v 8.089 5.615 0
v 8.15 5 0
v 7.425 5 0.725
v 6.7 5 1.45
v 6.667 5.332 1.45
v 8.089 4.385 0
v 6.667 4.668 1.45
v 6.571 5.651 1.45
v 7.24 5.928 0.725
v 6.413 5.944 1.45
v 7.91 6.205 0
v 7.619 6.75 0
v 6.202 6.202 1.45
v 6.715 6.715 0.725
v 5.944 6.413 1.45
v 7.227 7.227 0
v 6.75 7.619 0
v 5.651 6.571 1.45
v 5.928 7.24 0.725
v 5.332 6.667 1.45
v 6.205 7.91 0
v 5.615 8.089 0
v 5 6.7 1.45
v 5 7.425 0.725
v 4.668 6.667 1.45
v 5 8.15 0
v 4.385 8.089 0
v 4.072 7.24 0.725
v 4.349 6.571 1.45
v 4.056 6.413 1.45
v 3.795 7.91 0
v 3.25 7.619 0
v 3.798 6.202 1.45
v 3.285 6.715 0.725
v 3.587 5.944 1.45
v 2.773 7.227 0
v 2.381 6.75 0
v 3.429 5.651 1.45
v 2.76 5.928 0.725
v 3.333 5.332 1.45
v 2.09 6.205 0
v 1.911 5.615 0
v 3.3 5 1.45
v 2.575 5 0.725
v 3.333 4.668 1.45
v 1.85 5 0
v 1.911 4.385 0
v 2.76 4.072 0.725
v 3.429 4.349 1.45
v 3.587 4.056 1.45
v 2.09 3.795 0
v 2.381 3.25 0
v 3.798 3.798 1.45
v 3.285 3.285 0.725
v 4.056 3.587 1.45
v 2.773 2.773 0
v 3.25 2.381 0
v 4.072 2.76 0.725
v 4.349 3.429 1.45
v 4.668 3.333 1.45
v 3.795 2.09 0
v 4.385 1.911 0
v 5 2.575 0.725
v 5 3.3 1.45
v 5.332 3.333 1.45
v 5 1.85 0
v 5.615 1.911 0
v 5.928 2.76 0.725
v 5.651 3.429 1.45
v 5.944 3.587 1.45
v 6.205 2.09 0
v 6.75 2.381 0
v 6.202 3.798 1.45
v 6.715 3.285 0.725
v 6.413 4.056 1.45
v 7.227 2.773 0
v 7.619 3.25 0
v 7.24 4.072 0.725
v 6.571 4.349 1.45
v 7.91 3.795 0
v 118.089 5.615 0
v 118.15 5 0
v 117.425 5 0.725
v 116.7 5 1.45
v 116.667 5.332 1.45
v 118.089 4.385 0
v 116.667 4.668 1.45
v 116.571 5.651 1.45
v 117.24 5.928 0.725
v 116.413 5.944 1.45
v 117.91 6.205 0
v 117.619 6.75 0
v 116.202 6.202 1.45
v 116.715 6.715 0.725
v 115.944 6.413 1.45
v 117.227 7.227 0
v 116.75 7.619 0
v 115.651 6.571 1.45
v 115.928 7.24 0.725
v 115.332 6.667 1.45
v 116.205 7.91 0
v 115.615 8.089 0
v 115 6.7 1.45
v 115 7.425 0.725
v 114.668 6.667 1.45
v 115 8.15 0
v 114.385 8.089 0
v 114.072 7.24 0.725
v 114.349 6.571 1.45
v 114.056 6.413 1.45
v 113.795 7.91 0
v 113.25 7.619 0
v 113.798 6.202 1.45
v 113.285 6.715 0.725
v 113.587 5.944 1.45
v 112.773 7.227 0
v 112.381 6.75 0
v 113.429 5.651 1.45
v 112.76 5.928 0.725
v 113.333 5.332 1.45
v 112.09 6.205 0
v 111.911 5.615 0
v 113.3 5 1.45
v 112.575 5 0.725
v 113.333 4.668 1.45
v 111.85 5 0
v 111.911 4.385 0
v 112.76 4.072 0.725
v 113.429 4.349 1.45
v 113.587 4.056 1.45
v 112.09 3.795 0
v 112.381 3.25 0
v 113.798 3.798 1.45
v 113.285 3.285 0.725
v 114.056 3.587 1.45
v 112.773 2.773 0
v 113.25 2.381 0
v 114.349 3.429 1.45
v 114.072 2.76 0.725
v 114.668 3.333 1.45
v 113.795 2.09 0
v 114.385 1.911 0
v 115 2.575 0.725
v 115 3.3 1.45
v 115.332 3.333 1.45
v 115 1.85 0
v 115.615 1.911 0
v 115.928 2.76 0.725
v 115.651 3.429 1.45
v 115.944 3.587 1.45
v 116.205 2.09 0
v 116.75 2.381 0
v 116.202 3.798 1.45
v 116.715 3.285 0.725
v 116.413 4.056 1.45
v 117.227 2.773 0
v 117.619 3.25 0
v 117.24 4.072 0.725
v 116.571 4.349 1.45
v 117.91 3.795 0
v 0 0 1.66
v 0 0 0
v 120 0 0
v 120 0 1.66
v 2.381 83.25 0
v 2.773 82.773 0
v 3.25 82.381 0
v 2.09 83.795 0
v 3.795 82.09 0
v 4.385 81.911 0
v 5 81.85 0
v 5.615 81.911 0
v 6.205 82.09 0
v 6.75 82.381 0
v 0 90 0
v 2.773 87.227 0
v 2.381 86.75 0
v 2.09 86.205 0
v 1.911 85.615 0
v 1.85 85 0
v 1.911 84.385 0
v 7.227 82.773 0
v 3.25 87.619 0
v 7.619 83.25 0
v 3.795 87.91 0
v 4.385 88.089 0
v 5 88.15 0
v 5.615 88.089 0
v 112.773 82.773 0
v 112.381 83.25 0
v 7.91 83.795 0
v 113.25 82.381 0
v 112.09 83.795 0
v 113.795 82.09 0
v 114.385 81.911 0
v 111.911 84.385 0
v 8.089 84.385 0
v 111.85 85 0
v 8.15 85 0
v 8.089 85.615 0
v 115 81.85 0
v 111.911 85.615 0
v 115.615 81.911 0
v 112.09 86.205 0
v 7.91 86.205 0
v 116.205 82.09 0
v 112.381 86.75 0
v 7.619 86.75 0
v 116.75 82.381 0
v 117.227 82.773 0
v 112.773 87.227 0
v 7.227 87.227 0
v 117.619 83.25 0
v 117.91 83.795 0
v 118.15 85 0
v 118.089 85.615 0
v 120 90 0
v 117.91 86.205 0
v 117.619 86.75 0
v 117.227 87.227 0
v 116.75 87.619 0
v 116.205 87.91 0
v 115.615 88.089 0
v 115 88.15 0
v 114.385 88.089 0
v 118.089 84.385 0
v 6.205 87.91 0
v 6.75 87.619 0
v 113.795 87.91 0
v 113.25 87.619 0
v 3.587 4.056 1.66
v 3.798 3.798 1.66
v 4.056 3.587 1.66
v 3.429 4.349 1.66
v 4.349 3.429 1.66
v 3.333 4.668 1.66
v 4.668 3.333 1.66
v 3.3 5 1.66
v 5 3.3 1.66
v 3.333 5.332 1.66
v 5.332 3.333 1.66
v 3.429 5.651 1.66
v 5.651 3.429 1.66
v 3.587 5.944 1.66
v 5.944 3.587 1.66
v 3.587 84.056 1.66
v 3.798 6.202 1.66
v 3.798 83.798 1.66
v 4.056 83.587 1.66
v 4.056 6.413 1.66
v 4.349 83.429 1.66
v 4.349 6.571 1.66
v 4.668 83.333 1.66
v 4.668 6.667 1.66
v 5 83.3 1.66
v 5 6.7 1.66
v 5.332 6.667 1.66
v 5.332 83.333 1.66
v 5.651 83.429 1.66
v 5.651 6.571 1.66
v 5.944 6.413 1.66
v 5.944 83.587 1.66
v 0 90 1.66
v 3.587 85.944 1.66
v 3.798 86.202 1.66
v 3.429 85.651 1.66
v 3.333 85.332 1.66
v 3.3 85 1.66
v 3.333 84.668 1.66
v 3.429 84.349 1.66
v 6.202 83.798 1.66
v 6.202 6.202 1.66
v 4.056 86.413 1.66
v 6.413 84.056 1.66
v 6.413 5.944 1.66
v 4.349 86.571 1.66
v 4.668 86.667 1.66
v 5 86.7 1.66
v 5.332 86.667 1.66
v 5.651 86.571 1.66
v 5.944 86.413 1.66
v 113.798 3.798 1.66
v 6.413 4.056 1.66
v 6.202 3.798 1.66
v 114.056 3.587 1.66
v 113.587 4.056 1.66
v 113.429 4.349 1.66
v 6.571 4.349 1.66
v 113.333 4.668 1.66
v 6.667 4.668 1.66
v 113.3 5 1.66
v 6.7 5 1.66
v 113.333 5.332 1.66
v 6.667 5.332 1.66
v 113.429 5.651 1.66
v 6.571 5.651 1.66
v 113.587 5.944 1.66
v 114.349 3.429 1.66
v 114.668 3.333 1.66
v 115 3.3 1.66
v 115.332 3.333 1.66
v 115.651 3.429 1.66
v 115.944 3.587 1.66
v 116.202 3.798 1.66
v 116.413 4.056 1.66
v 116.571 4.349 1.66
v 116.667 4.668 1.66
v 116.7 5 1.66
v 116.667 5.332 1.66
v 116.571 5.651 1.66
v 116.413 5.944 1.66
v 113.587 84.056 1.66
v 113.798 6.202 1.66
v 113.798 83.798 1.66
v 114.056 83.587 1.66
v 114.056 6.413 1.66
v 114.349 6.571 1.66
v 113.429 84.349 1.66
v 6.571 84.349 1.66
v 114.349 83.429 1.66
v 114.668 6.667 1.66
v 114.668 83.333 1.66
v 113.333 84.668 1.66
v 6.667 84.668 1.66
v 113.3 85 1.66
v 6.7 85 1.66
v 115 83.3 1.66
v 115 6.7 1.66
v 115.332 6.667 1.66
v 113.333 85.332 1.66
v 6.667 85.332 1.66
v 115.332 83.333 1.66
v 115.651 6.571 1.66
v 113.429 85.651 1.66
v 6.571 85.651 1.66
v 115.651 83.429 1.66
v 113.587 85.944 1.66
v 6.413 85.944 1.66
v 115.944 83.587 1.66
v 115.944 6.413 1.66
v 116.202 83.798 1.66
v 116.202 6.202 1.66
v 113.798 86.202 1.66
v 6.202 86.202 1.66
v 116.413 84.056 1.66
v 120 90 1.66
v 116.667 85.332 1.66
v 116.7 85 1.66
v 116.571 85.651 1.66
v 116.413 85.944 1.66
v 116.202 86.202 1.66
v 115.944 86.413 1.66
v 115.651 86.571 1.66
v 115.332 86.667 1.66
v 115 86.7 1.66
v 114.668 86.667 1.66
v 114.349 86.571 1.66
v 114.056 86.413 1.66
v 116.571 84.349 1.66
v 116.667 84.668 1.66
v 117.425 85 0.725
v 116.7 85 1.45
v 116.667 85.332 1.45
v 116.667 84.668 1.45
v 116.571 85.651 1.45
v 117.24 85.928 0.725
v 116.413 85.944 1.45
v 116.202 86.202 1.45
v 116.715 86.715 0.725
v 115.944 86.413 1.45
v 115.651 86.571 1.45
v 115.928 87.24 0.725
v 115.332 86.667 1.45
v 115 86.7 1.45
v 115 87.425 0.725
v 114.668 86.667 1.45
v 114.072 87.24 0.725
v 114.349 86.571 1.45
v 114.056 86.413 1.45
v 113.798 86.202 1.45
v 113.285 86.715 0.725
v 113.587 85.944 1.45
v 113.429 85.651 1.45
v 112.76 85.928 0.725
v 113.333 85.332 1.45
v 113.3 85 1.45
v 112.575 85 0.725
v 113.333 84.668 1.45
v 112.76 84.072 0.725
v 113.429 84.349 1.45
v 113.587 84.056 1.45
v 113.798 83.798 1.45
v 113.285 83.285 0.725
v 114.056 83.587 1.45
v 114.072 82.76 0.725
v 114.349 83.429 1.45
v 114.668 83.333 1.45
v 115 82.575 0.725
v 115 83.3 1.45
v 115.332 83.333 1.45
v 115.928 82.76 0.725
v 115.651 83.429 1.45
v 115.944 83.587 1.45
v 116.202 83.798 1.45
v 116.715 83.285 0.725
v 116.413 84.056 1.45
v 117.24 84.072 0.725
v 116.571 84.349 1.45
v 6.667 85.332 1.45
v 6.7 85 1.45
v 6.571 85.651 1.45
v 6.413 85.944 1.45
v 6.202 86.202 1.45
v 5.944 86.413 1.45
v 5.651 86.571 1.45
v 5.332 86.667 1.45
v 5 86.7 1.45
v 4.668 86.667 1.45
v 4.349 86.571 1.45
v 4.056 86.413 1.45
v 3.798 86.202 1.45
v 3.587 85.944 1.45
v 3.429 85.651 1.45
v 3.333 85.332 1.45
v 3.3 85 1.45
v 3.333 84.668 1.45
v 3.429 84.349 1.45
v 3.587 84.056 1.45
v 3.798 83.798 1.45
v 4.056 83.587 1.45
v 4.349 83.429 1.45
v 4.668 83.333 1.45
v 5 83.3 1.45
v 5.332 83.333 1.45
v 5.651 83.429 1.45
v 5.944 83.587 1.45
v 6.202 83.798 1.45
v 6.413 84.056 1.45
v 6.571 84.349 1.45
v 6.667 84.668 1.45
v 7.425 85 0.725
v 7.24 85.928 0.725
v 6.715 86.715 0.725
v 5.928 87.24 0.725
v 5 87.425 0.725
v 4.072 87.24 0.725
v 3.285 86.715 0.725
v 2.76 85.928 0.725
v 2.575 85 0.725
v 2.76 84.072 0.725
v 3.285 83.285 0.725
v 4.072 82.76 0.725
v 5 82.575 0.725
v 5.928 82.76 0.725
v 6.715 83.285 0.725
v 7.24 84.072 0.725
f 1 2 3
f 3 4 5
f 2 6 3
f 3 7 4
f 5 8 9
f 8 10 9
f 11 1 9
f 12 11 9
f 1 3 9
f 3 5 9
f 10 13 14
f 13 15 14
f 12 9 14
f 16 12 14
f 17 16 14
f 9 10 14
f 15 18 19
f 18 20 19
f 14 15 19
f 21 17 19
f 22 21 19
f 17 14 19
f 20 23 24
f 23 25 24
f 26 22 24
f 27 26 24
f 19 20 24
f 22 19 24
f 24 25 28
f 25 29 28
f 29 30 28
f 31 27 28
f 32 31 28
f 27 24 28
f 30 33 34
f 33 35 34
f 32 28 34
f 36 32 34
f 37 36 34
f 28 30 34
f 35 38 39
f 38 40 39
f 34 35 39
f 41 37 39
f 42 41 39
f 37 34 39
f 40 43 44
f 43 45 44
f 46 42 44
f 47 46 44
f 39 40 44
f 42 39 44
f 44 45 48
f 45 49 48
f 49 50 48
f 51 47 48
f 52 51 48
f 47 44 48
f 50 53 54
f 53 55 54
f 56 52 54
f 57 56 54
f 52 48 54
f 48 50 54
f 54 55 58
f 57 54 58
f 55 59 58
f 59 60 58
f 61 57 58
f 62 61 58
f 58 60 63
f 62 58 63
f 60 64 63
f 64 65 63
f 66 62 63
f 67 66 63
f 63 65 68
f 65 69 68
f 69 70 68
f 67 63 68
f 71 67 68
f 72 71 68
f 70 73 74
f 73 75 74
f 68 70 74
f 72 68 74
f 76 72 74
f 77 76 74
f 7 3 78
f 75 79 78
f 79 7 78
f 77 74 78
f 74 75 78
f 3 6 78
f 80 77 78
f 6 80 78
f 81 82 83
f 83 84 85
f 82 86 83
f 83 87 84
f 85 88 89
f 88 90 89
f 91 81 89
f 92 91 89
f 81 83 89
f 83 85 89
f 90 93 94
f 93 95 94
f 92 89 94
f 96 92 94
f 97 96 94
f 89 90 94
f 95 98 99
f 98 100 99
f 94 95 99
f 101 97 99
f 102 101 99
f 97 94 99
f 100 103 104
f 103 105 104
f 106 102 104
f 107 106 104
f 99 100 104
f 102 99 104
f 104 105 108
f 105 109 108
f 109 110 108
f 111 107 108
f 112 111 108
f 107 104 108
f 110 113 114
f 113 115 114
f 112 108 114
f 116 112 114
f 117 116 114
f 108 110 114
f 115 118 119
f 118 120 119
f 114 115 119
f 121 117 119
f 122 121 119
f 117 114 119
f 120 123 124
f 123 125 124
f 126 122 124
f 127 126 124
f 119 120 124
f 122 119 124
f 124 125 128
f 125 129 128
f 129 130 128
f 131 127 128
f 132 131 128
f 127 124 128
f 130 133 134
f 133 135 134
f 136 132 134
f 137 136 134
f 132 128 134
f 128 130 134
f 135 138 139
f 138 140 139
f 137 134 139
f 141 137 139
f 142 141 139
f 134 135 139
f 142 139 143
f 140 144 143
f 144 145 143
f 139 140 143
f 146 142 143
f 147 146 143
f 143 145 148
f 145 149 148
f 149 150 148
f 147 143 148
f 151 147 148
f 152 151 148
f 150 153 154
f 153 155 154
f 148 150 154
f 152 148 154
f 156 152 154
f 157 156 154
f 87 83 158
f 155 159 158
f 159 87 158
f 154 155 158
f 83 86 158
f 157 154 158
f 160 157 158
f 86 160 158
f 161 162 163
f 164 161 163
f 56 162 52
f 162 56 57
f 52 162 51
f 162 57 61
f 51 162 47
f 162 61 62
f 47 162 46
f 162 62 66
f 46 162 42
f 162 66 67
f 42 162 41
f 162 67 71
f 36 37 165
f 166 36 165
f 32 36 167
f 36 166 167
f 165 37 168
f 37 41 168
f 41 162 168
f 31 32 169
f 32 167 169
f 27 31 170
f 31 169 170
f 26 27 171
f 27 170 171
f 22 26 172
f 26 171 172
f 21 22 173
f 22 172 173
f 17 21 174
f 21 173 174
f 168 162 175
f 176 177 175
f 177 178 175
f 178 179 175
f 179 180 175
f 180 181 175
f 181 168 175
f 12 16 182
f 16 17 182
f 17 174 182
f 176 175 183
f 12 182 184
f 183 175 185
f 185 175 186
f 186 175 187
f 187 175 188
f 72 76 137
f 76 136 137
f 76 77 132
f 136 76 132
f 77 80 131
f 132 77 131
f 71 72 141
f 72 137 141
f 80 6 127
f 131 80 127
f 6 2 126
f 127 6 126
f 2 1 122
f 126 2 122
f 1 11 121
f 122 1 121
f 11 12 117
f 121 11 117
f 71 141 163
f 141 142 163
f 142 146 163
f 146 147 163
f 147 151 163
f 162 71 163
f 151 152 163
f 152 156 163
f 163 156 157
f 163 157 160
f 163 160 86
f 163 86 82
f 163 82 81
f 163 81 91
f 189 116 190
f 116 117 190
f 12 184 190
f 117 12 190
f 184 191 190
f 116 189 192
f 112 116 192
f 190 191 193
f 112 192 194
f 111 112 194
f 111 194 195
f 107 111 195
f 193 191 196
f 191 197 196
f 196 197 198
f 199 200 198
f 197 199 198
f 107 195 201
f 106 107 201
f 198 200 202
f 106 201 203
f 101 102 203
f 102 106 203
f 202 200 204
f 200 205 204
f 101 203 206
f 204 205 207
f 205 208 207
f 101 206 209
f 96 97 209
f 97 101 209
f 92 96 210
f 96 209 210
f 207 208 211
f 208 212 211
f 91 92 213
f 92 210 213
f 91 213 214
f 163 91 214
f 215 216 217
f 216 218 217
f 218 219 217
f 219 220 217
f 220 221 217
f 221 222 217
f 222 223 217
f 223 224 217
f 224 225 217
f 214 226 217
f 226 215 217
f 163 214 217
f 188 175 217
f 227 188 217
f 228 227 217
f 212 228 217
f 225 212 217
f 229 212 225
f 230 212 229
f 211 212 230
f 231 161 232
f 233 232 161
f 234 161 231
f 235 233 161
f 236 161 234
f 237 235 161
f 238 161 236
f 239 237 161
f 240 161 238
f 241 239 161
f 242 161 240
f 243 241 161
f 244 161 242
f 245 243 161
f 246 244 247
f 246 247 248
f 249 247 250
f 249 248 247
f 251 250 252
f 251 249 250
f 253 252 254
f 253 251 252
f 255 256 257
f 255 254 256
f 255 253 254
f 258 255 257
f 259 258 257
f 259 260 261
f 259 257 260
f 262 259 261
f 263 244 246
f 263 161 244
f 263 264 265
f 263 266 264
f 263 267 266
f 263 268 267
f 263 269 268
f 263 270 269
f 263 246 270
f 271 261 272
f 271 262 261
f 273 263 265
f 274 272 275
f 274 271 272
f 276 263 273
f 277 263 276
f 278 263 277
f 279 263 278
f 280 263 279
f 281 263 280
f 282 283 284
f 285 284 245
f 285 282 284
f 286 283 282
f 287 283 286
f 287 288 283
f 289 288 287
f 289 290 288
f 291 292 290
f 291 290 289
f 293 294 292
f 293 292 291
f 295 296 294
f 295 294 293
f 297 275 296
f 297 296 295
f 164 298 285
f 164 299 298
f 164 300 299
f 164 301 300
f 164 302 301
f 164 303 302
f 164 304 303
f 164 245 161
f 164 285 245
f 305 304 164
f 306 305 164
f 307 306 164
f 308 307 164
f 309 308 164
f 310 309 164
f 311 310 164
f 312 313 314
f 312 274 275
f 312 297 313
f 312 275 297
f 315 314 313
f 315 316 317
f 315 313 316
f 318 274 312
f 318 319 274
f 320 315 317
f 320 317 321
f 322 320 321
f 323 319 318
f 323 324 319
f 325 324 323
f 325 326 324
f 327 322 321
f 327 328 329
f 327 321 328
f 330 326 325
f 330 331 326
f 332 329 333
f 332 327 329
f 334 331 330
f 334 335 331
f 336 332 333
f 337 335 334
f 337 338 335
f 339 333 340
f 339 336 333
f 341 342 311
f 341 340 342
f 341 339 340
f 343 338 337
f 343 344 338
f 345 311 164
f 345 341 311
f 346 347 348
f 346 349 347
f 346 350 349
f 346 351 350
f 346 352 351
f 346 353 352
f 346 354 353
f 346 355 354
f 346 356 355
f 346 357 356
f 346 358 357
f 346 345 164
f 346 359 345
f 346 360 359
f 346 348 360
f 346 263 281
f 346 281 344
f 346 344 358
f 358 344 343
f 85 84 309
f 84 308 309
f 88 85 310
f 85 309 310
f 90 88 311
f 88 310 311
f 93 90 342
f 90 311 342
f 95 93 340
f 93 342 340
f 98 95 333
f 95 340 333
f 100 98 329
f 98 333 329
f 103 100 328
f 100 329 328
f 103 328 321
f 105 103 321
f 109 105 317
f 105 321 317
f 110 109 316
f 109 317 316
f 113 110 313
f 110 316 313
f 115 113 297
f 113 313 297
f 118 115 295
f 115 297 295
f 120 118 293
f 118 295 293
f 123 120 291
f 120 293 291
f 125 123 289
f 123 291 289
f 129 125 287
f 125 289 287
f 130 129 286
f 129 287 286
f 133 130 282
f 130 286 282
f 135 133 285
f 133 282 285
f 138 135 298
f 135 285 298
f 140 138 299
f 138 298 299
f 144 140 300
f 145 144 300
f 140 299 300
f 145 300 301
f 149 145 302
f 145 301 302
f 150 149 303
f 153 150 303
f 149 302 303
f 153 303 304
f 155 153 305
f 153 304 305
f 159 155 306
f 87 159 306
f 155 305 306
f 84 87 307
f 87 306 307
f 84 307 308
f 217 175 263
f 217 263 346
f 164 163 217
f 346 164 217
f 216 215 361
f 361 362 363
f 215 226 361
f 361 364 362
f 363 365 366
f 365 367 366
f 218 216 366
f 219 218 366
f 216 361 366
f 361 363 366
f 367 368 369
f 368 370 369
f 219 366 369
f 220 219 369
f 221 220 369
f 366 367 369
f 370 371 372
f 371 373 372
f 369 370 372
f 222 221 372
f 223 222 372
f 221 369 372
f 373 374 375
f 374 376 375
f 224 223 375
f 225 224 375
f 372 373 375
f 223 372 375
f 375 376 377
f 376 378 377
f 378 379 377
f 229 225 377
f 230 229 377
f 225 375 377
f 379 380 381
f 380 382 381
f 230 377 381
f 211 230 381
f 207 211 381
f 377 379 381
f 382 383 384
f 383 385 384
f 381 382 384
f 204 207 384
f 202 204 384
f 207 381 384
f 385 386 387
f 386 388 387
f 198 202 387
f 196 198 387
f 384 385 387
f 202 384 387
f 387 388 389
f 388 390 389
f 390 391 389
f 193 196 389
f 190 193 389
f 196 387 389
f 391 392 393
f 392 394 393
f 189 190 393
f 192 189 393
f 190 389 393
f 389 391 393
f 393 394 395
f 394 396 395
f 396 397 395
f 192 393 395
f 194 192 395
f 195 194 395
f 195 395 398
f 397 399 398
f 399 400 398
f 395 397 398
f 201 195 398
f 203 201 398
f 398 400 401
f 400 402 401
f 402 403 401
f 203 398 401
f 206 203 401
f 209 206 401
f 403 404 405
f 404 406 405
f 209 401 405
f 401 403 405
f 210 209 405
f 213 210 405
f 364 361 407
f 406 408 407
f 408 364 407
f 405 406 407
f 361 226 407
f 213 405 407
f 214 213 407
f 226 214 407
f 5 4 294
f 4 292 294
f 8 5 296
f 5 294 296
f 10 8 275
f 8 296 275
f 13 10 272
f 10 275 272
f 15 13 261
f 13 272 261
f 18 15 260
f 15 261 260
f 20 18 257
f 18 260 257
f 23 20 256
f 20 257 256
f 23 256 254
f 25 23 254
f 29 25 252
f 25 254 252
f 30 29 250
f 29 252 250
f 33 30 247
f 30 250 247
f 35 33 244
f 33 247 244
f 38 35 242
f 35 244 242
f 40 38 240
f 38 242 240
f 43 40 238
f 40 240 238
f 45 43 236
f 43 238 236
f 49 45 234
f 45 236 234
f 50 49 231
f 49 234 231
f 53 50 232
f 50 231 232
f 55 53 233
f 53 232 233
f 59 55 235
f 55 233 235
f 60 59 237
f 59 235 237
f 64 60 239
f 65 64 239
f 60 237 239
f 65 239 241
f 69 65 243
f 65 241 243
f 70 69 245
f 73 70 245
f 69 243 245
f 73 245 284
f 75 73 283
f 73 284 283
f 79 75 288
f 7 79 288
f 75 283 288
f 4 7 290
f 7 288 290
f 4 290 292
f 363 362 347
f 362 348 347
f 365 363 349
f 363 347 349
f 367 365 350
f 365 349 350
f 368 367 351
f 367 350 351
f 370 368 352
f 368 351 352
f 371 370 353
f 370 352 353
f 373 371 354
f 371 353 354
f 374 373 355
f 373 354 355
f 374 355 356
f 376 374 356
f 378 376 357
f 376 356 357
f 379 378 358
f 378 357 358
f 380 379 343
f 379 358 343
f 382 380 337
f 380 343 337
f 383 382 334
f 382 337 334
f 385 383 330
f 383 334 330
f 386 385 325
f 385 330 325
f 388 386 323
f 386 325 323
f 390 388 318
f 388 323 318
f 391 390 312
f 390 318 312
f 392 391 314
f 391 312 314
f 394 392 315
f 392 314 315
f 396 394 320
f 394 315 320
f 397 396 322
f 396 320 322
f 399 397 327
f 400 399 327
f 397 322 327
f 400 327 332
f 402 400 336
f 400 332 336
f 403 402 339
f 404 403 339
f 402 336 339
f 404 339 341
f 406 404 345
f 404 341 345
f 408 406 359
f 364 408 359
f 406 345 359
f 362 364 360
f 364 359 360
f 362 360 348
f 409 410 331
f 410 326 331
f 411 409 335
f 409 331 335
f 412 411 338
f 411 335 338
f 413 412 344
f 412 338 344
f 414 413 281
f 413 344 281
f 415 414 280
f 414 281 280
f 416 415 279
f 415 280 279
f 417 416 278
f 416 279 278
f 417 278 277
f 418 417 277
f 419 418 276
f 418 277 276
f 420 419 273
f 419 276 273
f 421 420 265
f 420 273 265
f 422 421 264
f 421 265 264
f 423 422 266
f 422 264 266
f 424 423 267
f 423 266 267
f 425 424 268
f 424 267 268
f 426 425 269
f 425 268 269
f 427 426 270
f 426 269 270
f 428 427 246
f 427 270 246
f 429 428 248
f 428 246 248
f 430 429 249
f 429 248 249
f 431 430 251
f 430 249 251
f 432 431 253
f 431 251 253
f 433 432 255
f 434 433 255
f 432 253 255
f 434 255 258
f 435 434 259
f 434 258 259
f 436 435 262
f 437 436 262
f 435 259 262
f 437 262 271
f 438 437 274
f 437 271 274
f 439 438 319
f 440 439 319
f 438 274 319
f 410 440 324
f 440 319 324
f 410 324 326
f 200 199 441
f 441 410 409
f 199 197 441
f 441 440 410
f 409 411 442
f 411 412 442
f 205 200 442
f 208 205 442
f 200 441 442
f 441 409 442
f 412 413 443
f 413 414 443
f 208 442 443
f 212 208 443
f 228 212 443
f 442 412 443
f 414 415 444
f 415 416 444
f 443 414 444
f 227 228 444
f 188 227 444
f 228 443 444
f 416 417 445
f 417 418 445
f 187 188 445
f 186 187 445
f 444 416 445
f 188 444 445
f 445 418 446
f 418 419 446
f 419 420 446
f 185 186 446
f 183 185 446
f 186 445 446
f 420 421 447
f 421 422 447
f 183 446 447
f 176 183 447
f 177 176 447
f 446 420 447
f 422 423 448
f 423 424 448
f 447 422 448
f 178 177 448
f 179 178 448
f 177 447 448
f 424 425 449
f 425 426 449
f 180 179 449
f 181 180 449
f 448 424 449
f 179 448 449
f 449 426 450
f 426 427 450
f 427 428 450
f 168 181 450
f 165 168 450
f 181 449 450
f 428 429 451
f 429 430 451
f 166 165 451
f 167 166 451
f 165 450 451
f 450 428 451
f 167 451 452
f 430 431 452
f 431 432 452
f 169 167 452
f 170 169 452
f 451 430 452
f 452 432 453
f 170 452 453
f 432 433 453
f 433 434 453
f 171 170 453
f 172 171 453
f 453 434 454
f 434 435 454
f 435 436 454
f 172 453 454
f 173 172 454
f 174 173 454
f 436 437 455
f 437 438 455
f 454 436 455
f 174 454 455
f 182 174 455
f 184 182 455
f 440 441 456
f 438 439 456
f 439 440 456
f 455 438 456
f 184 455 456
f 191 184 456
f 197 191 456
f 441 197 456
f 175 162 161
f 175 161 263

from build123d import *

# Parameters (mm, degrees)
SKETCH1_W                                           = 120
SKETCH1_H                                           = 90
BOSS_EXTRUDE1_DEPTH                                 = 1.66
CSK_FOR_M3_COUNTERSUNK_FLAT_HEAD_SCREW1_D           = 3.4
CSK_FOR_M3_COUNTERSUNK_FLAT_HEAD_SCREW1_DEPTH       = 30
CSK_FOR_M3_COUNTERSUNK_FLAT_HEAD_SCREW1_CSINK_D     = 6.3
CSK_FOR_M3_COUNTERSUNK_FLAT_HEAD_SCREW1_CSINK_ANGLE = 90
CSK_FOR_M3_COUNTERSUNK_FLAT_HEAD_SCREW1_TIP         = 1.021463052


with BuildPart() as part:
    # Sketch1 → Boss-Extrude1 (new body)
    with BuildSketch(Plane.XY):
        with Locations((60, 45)):
            Rectangle(SKETCH1_W, SKETCH1_H)
    extrude(amount=BOSS_EXTRUDE1_DEPTH)

    # CSK for M3 Countersunk Flat Head Screw1
    with Locations(Plane(origin=(0, 0, 0), x_dir=(-1, 0, 0), z_dir=(0, 0, -1))):
        with Locations((-5, 5), (-5, 85), (-115, 85), (-115, 5)):
            CounterSinkHole(CSK_FOR_M3_COUNTERSUNK_FLAT_HEAD_SCREW1_D / 2, CSK_FOR_M3_COUNTERSUNK_FLAT_HEAD_SCREW1_CSINK_D / 2, depth=CSK_FOR_M3_COUNTERSUNK_FLAT_HEAD_SCREW1_DEPTH, counter_sink_angle=CSK_FOR_M3_COUNTERSUNK_FLAT_HEAD_SCREW1_CSINK_ANGLE)
            with Locations((0, 0, -(CSK_FOR_M3_COUNTERSUNK_FLAT_HEAD_SCREW1_DEPTH + CSK_FOR_M3_COUNTERSUNK_FLAT_HEAD_SCREW1_TIP / 2))):  # 118° drill point
                Cone(0, CSK_FOR_M3_COUNTERSUNK_FLAT_HEAD_SCREW1_D / 2, CSK_FOR_M3_COUNTERSUNK_FLAT_HEAD_SCREW1_TIP, mode=Mode.SUBTRACT)


solid = part.part
